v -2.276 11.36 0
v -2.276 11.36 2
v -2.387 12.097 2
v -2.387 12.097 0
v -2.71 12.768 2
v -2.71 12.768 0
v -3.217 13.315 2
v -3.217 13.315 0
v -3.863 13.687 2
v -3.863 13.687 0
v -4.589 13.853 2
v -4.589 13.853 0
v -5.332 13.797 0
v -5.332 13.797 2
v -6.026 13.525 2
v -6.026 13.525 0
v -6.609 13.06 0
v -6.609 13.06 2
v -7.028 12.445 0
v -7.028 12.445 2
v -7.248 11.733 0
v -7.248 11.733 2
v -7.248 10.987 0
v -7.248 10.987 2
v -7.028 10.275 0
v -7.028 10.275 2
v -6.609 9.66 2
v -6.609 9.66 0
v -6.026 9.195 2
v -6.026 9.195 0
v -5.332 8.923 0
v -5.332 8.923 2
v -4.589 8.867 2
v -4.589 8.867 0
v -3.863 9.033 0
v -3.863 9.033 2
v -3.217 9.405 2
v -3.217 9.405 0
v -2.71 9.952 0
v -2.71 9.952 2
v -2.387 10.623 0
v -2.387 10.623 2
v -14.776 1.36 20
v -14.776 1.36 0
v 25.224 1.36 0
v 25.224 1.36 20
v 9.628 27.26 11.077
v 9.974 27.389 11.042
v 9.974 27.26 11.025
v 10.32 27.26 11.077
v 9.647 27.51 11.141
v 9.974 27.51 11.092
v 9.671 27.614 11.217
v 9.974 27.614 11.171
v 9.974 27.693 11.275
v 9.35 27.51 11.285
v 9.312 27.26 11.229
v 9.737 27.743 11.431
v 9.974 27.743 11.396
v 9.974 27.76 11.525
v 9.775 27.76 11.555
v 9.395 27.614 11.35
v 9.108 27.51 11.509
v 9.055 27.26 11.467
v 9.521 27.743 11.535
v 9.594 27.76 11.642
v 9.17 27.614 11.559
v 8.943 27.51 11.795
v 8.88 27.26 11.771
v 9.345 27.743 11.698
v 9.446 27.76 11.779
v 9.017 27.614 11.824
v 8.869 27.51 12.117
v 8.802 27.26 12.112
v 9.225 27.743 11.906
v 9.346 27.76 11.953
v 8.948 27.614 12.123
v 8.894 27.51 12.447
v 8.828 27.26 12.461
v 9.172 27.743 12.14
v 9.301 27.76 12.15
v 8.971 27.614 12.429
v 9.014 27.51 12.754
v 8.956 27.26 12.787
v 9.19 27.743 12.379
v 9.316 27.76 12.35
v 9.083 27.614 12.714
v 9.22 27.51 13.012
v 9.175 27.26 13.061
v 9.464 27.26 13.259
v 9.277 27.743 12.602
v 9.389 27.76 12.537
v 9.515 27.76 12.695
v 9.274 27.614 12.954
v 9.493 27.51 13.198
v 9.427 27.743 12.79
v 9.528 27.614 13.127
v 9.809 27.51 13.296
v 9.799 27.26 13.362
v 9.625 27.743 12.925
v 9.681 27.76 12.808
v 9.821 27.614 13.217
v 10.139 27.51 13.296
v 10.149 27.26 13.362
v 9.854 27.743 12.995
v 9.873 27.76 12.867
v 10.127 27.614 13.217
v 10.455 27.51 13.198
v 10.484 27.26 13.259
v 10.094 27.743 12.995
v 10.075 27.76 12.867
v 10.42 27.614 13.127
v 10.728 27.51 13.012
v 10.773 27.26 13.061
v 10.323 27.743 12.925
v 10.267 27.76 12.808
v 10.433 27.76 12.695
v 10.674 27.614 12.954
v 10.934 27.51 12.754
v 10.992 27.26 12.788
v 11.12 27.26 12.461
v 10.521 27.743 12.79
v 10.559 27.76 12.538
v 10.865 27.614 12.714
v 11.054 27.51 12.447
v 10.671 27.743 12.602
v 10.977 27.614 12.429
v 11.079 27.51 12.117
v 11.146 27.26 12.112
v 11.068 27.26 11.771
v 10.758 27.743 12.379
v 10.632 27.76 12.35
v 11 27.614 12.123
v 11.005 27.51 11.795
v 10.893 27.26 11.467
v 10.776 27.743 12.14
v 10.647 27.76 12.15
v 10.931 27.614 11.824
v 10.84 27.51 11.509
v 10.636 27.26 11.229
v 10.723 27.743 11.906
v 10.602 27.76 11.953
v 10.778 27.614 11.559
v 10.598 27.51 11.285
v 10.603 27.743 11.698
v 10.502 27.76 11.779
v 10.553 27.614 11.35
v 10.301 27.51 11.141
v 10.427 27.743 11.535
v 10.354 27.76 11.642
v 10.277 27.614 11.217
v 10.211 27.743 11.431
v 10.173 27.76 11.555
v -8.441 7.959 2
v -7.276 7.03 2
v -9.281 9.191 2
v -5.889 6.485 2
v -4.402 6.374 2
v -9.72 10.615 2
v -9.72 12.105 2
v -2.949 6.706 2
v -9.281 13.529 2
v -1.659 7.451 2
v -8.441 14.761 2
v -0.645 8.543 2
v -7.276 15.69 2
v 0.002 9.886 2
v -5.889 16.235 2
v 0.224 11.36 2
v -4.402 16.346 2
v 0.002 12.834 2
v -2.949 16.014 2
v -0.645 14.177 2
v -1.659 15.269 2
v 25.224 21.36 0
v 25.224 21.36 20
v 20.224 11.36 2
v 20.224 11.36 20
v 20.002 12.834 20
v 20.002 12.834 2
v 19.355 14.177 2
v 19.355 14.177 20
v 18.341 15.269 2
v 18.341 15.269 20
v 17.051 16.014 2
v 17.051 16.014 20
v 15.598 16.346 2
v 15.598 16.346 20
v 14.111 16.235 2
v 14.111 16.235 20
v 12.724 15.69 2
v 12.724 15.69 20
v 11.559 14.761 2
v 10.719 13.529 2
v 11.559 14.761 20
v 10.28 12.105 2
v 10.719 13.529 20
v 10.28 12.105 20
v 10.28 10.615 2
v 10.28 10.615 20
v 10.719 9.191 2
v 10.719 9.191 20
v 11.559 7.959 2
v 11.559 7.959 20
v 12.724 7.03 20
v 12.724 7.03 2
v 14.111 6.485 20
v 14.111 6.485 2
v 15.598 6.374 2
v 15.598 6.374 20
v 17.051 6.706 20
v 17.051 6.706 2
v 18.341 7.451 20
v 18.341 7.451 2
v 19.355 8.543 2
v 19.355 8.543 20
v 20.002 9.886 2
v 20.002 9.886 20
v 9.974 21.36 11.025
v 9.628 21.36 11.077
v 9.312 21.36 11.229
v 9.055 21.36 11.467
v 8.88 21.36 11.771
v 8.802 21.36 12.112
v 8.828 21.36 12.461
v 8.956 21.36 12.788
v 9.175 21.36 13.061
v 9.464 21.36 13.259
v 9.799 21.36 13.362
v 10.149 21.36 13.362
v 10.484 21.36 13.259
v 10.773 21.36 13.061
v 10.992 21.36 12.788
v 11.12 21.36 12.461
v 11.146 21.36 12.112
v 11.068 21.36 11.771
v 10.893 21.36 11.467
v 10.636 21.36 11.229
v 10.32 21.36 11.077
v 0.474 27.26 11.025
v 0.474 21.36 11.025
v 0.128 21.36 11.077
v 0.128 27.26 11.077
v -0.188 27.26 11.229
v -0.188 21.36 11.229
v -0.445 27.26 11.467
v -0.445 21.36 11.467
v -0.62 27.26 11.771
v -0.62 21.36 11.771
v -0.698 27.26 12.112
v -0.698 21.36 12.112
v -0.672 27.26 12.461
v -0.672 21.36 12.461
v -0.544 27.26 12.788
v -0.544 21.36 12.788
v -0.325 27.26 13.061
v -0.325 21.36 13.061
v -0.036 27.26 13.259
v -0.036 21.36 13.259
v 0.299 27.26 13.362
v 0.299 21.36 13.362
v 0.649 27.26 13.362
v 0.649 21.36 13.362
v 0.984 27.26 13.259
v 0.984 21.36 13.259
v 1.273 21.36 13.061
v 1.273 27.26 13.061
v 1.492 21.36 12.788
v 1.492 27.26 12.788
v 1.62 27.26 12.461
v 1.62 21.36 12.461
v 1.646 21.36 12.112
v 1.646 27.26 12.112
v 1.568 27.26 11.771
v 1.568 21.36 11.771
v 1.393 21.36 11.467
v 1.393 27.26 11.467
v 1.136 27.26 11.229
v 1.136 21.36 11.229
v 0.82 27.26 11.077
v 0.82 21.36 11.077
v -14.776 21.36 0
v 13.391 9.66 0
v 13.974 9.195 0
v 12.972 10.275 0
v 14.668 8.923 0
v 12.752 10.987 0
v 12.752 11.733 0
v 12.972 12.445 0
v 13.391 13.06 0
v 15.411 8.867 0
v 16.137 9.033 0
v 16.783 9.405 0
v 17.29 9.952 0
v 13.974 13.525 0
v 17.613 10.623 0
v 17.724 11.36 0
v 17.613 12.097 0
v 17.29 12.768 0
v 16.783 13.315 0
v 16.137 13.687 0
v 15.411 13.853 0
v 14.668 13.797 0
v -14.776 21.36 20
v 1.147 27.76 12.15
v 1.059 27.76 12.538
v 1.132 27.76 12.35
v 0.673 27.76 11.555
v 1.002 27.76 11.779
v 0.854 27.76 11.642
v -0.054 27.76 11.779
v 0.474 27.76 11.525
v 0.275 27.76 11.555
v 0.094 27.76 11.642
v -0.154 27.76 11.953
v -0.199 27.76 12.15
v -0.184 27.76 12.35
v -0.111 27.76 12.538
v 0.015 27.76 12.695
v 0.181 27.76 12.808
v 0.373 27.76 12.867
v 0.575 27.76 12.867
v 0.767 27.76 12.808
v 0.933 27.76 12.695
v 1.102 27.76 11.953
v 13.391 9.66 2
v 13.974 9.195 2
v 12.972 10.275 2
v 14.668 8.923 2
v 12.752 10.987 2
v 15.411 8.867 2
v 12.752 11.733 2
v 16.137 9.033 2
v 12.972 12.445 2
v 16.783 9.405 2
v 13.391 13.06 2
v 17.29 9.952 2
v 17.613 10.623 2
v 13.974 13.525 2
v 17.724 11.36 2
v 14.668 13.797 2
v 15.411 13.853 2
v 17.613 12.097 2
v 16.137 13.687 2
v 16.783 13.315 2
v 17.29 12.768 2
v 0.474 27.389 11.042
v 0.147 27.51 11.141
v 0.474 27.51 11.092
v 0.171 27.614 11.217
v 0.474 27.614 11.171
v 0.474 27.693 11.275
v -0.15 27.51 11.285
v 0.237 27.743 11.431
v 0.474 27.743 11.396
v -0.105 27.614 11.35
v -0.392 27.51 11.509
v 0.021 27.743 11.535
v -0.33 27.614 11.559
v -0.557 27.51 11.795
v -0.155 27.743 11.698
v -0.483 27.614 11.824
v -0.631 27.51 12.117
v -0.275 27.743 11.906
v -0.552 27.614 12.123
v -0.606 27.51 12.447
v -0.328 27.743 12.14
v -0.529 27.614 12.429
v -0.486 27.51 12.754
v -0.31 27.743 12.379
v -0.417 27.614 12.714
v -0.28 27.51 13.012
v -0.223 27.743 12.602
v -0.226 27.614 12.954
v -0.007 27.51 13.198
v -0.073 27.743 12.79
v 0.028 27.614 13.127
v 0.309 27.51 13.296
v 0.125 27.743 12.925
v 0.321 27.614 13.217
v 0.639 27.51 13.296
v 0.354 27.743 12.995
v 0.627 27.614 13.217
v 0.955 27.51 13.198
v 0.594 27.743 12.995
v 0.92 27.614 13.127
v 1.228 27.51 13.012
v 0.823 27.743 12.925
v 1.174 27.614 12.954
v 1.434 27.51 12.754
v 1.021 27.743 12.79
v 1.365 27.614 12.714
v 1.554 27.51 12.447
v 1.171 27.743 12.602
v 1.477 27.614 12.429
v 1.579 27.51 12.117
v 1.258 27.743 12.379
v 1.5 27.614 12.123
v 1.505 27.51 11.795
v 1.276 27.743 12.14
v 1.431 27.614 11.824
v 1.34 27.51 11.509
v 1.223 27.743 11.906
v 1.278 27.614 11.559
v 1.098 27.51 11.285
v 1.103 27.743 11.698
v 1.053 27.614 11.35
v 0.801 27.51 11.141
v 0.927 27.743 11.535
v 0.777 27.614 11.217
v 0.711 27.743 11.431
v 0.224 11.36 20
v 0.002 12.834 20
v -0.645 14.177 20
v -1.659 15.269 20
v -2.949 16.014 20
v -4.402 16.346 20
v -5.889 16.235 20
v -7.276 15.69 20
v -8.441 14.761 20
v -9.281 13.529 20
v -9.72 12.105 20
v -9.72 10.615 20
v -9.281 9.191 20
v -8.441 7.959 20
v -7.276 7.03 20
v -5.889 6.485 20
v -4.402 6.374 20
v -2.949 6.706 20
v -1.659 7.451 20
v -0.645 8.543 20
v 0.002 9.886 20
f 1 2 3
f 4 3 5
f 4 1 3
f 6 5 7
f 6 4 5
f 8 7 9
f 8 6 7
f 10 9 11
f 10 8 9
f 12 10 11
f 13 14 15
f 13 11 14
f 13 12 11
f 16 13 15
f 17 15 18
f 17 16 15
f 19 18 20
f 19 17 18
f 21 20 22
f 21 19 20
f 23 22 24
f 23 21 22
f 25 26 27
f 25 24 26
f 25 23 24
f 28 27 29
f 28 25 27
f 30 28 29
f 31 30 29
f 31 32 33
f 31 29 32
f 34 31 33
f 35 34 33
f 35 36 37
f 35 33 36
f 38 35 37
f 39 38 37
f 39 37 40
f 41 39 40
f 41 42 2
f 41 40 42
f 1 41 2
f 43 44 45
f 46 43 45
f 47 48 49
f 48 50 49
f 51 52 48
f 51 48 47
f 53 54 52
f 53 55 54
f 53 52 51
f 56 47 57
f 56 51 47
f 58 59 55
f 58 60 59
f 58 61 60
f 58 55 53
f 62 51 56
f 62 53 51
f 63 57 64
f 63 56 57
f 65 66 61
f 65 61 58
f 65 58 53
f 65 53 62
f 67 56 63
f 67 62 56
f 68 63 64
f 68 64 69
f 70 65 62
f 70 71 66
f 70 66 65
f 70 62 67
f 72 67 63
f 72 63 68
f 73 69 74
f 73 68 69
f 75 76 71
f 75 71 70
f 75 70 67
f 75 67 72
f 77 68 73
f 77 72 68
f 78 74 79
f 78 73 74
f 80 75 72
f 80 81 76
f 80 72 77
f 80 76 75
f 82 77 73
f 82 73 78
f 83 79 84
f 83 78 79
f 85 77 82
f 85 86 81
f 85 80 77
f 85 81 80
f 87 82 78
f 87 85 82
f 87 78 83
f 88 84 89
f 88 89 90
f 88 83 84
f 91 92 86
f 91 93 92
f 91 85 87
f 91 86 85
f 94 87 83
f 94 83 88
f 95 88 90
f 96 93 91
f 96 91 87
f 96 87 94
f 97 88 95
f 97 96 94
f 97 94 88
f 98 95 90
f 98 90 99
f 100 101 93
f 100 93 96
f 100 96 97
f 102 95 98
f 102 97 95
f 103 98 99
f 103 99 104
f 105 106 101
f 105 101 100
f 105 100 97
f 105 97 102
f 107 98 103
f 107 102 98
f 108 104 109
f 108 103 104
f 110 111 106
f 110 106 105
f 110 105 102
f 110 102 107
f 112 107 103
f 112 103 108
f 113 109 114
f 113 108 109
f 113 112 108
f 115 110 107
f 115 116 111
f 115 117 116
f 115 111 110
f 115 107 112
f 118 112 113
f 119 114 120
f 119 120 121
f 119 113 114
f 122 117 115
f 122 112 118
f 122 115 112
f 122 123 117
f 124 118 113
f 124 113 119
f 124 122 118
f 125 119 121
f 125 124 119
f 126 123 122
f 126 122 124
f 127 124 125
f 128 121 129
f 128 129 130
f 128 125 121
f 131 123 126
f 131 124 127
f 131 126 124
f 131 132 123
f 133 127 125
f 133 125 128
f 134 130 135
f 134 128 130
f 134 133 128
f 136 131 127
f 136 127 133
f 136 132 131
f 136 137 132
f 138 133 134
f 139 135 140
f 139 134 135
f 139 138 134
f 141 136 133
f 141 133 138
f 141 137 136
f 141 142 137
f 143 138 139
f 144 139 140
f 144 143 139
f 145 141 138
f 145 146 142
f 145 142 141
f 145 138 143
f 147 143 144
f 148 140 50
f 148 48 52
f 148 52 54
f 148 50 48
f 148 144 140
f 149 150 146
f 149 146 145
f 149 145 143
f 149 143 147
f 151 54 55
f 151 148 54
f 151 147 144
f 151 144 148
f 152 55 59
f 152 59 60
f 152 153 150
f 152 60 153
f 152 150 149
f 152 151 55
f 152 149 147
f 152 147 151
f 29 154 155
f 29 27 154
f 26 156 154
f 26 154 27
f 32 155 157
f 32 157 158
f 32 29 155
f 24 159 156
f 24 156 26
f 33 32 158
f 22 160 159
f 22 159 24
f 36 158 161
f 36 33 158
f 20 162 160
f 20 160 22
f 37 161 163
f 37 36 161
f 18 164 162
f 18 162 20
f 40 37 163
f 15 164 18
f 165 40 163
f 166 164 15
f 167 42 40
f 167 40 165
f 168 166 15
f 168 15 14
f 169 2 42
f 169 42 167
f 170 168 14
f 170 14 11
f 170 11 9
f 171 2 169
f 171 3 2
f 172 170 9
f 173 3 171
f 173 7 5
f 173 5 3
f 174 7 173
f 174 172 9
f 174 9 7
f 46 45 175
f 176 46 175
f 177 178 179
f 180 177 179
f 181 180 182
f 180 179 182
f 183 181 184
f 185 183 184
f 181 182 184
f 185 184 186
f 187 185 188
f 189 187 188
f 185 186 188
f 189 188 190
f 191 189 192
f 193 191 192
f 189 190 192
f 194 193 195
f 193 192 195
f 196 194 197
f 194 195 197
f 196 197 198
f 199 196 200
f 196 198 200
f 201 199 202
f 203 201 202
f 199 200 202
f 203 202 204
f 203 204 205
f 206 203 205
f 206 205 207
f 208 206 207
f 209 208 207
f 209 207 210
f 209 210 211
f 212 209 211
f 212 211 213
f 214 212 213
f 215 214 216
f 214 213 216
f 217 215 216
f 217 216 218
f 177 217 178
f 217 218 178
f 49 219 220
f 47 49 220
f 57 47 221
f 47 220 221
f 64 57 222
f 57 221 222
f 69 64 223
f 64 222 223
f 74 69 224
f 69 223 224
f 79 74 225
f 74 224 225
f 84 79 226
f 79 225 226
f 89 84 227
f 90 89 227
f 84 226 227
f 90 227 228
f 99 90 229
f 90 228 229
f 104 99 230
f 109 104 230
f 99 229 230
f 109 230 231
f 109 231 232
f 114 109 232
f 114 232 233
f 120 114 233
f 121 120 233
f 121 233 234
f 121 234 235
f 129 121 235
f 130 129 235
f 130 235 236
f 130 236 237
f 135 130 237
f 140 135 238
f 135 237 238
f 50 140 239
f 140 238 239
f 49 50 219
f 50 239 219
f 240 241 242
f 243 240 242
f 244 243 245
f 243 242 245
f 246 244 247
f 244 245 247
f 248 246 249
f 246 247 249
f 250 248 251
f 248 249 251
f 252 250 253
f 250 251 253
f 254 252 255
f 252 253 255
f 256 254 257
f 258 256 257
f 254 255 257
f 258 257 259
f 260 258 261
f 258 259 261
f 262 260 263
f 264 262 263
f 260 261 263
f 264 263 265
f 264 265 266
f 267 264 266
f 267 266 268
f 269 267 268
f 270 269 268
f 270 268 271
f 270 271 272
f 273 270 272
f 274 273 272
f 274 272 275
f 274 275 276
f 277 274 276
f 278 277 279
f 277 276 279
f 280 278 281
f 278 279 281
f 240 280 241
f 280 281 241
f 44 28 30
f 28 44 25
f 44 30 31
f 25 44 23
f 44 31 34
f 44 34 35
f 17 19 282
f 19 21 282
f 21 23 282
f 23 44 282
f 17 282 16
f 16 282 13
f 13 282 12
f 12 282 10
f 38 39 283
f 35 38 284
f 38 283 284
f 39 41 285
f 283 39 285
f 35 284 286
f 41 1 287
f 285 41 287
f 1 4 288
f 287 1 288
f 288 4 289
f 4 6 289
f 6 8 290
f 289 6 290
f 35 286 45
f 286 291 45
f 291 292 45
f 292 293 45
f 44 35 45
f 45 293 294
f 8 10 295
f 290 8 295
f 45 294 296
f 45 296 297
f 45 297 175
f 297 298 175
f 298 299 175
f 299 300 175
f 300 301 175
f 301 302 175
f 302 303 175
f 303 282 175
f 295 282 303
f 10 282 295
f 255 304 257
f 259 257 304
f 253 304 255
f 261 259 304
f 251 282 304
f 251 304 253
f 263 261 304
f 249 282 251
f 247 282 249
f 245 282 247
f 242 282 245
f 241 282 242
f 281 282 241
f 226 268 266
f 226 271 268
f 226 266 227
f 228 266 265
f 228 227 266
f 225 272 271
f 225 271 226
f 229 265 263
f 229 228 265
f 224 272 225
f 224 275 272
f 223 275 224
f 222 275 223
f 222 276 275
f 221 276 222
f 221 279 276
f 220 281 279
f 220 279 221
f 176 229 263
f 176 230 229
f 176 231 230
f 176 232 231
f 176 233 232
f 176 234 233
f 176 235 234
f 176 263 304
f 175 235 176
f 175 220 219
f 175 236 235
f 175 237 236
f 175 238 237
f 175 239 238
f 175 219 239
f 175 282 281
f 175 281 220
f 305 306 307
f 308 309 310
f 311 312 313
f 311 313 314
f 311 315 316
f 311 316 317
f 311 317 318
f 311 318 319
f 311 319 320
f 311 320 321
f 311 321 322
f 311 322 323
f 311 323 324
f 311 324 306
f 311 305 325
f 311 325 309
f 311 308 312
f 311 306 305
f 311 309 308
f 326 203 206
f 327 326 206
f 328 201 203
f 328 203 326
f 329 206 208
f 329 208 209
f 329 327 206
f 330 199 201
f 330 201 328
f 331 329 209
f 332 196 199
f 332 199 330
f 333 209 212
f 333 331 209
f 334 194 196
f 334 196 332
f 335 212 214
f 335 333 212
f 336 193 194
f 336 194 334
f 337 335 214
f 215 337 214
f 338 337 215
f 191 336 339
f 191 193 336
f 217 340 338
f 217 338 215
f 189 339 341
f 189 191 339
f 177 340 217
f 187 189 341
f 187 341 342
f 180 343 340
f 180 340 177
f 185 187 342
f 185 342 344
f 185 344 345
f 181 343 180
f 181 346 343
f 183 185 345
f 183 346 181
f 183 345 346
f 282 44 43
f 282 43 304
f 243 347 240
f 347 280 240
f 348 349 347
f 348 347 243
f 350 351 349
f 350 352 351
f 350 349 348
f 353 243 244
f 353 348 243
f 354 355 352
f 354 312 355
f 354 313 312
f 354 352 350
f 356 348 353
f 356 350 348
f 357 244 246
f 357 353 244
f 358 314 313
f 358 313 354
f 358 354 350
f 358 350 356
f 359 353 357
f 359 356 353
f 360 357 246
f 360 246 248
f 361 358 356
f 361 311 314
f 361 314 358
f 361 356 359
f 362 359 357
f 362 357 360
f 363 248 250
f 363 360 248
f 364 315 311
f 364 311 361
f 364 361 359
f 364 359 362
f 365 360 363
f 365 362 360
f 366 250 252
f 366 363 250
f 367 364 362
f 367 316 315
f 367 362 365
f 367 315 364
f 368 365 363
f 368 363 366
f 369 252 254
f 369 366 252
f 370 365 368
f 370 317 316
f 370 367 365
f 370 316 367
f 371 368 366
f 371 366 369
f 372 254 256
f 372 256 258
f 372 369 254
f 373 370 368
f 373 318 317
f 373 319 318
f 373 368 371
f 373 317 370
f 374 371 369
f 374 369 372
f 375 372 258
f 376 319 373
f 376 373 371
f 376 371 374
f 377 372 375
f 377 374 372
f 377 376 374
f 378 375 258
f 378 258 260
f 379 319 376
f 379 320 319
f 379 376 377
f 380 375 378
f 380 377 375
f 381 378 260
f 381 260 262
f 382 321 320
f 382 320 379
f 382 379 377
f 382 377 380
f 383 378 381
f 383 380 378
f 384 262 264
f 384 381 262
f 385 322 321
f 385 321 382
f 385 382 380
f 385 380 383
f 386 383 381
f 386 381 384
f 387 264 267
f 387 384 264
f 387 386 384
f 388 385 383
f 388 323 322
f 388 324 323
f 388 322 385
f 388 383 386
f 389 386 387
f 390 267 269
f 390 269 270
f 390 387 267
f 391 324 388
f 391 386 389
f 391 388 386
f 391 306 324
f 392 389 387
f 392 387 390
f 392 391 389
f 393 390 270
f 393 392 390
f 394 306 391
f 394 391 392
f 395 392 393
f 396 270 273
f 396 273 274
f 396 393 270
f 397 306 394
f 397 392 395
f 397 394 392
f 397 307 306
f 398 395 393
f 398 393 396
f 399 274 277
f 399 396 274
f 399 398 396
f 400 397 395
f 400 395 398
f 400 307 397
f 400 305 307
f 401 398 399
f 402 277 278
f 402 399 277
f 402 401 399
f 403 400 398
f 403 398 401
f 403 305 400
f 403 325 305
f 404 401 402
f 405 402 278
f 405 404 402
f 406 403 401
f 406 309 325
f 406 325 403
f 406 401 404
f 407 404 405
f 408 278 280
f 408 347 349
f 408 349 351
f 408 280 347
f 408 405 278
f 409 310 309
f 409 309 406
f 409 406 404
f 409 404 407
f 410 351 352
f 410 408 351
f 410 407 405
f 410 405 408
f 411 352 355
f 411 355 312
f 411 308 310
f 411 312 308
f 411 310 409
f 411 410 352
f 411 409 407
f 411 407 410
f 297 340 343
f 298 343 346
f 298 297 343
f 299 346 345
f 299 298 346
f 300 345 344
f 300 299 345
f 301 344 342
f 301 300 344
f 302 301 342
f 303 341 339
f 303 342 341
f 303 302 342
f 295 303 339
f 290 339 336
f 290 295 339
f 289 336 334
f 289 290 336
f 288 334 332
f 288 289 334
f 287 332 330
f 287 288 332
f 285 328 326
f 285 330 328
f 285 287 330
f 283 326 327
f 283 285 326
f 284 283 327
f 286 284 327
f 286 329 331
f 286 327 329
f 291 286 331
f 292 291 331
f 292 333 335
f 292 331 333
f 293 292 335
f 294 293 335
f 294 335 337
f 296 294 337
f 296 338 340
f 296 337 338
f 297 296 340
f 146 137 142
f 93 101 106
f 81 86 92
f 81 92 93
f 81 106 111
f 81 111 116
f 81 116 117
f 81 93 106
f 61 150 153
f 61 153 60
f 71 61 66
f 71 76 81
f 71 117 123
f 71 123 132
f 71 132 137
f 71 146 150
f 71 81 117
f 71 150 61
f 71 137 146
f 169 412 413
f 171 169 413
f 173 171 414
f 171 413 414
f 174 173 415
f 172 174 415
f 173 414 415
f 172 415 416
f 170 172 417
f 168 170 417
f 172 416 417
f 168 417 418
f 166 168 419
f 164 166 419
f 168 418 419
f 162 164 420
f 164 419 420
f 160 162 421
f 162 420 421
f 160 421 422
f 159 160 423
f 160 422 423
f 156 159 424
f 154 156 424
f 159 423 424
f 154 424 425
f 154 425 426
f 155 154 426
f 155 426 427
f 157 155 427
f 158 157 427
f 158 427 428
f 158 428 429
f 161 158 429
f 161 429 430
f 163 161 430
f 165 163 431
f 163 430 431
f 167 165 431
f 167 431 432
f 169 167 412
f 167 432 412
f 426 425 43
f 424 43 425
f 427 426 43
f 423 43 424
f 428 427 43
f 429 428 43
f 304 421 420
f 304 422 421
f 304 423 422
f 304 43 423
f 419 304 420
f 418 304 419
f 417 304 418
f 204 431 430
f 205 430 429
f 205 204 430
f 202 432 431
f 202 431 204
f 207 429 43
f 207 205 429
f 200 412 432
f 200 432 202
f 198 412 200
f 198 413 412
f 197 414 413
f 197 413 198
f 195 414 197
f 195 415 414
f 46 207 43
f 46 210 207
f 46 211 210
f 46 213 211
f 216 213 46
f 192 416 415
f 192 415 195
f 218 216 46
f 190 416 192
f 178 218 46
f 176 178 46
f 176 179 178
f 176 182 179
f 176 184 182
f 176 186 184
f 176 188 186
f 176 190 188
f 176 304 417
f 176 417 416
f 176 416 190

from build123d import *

# Parameters (mm, degrees)
SKETCH1_W           = 40
SKETCH1_H           = 20
SKETCH1_R           = 2.5
BOSS_EXTRUDE1_DEPTH = 20
SKETCH2_R           = 5
CUT_EXTRUDE1_DEPTH  = 18
SKETCH4_R           = 1.175
BOSS_EXTRUDE2_DEPTH = 6.4
FILLET1_R           = 0.5


with BuildPart() as part:
    # Sketch1 → Boss-Extrude1 (new body)
    with BuildSketch(Plane.XY):
        with Locations((5.224, 11.36)):
            Rectangle(SKETCH1_W, SKETCH1_H)
        with Locations((-4.776, 11.36)):
            Circle(SKETCH1_R, mode=Mode.SUBTRACT)
        with Locations((15.224, 11.36)):
            Circle(SKETCH1_R, mode=Mode.SUBTRACT)
    extrude(amount=BOSS_EXTRUDE1_DEPTH)

    # Sketch2 → Cut-Extrude1 (cut)
    with BuildSketch(Plane.XY.offset(20)):
        with Locations((-4.776, 11.36)):
            Circle(SKETCH2_R)
        with Locations((15.224, 11.36)):
            Circle(SKETCH2_R)
    extrude(amount=-CUT_EXTRUDE1_DEPTH, mode=Mode.SUBTRACT)

    # Sketch4 → Boss-Extrude2 (add)
    with BuildSketch(Plane(origin=(0, 21.36, 0), x_dir=(1, 0, 0), z_dir=(0, 1, 0))):
        with Locations(Location((9.974, -12.2, 0), (0, 0, 90))):
            Circle(SKETCH4_R)
        with Locations(Location((0.474, -12.2, 0), (0, 0, 90))):
            Circle(SKETCH4_R)
    extrude(amount=BOSS_EXTRUDE2_DEPTH)

    # Fillet1
    fillet1_edges = [part.edges().sort_by_distance(p)[0] for p in [
        (9.974, 27.76, 13.375),
        (0.474, 27.76, 13.375),
    ]]
    fillet(fillet1_edges, radius=FILLET1_R)


solid = part.part
